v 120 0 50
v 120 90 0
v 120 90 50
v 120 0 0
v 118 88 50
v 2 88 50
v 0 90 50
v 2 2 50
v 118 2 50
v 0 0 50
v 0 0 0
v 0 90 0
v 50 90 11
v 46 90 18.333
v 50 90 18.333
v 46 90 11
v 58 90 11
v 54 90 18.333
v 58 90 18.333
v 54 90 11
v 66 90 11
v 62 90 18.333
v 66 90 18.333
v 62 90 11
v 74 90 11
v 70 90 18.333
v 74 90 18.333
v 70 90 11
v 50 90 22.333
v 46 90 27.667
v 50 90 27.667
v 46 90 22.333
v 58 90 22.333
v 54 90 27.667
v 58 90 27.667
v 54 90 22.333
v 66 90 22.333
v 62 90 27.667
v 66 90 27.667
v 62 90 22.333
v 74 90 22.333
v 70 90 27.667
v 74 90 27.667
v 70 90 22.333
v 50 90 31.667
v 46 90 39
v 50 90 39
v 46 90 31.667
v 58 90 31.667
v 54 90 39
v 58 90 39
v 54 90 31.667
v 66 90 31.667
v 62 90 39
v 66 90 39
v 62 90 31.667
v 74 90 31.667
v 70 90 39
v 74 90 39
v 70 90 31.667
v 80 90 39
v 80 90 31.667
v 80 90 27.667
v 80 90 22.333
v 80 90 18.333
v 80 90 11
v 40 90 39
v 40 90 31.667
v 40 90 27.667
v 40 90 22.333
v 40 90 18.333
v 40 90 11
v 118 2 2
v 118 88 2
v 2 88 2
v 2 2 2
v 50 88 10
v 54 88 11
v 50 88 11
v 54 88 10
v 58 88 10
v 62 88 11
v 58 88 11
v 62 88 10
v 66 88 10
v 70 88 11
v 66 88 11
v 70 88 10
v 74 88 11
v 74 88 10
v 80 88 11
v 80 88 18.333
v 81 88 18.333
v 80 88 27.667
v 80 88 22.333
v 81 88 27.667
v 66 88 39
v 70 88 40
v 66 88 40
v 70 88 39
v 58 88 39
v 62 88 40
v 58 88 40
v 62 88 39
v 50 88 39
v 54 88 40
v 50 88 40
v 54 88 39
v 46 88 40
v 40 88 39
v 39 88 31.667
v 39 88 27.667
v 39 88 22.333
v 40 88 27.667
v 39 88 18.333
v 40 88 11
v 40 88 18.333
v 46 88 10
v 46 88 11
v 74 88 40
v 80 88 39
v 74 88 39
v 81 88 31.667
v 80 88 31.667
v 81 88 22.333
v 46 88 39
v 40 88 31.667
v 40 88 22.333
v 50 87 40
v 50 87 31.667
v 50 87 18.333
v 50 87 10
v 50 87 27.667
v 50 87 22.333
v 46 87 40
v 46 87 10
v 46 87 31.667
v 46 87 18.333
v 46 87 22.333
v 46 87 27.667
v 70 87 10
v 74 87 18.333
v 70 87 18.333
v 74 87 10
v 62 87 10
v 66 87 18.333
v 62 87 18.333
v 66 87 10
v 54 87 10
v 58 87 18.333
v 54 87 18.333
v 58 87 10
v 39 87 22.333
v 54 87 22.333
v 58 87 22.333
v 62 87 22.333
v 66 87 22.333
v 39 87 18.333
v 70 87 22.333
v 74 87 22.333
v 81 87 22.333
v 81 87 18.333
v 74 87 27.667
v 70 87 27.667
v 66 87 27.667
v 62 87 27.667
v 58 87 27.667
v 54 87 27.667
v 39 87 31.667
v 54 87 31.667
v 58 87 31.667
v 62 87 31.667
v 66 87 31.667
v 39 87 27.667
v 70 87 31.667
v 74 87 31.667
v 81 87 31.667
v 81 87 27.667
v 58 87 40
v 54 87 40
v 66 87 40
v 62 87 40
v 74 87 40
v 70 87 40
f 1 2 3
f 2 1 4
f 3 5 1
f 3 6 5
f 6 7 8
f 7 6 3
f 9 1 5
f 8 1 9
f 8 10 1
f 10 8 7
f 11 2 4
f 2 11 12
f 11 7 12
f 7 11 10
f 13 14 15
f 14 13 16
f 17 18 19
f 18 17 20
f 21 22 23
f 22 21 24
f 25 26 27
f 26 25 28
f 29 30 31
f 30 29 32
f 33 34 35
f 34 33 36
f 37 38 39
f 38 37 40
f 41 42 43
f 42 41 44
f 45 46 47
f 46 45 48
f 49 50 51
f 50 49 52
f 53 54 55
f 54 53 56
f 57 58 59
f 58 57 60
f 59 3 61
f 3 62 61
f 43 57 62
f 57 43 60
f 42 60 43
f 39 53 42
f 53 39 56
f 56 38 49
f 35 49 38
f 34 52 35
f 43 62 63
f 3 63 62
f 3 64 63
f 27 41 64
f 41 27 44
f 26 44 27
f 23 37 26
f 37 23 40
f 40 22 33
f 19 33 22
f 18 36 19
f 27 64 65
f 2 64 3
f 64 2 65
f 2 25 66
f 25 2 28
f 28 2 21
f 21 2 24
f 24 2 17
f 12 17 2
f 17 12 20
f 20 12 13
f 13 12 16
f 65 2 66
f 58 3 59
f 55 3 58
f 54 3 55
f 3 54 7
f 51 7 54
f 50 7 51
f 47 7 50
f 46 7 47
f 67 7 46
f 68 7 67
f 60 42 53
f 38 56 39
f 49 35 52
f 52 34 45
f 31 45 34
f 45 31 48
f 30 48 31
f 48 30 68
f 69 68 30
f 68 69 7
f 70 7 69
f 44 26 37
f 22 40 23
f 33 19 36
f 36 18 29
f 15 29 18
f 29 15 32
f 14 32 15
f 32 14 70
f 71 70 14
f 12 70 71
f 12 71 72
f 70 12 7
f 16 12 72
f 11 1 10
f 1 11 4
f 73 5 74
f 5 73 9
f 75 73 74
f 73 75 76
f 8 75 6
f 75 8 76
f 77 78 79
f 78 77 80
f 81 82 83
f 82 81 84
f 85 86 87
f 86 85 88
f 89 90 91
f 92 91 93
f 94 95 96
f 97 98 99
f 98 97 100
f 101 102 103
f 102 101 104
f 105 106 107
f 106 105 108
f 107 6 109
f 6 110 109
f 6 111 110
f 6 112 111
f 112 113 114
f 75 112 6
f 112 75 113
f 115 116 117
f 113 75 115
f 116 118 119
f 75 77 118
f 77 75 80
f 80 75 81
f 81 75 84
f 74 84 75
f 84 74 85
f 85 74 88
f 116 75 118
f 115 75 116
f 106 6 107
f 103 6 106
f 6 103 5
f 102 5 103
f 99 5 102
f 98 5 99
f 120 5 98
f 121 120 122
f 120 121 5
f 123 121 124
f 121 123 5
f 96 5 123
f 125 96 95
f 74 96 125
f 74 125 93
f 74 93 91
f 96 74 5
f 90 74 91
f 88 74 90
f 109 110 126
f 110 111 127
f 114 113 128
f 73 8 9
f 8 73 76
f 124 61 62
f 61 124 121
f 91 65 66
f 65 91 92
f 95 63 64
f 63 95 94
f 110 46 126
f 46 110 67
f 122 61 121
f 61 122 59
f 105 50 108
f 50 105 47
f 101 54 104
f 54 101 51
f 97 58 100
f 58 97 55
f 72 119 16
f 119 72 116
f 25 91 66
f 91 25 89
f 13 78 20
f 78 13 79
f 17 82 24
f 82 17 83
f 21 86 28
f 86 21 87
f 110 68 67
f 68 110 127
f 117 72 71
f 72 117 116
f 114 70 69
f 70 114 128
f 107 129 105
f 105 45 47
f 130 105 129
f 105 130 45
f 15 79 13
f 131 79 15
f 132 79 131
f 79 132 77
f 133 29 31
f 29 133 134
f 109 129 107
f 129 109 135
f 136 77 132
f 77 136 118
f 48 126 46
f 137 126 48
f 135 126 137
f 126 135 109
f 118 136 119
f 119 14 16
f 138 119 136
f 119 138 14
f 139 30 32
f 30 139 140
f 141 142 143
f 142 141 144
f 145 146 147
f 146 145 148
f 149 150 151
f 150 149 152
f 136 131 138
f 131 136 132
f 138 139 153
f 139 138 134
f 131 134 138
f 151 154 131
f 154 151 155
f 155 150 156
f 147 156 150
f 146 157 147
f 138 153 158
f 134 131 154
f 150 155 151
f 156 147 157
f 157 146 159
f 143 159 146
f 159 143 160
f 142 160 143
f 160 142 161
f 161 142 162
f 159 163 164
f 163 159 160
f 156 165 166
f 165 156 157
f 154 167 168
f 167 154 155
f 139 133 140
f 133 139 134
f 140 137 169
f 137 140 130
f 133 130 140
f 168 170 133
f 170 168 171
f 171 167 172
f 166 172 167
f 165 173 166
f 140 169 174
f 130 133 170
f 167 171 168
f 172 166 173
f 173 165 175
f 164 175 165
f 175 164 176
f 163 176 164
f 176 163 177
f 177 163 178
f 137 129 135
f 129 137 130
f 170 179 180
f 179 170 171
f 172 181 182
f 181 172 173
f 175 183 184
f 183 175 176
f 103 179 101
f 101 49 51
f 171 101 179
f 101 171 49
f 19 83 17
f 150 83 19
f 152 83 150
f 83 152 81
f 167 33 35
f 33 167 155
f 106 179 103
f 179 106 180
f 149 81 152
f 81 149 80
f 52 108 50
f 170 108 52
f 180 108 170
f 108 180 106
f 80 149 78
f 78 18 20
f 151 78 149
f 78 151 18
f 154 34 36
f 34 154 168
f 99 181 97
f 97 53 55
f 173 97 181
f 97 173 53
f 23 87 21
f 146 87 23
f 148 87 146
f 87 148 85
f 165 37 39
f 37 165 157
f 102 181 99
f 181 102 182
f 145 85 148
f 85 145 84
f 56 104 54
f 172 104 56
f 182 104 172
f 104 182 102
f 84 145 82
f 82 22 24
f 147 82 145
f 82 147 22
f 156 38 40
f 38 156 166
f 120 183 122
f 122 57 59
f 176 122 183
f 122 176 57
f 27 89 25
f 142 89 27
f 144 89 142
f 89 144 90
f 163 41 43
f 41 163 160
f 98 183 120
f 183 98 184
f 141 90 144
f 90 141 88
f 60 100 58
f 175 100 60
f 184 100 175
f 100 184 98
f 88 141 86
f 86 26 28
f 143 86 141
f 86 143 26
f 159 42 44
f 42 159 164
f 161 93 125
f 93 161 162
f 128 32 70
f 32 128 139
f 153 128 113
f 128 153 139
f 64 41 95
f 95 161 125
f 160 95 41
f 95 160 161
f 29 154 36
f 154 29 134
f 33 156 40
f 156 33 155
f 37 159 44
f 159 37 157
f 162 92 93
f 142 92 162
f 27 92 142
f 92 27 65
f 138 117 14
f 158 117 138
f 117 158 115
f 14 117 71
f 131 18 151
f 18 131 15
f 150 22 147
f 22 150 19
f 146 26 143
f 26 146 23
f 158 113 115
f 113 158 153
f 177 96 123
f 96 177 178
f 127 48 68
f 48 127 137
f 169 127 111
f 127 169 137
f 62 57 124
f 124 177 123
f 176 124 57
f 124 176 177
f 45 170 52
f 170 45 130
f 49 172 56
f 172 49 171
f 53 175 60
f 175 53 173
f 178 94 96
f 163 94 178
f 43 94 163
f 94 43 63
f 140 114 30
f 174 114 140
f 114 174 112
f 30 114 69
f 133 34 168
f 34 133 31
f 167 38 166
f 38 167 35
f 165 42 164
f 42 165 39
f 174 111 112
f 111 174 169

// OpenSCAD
$fn = 32;

// ----------------------------------------------------------------------
// Vent box: crossgrid enclosure
// ----------------------------------------------------------------------

// --- parameters (mm) ---
box_l = 120;              // box length, X
box_w = 90;               // box width, Y
box_h = 50;               // box height, Z
wall_t = 2;               // shell wall thickness
win_l = 40;               // vent window width, X
win_h = 28;               // vent window height, Z
bar_w = 4;                // grid bar width
n_v = 4;                  // vertical bar count
n_h = 2;                  // horizontal bar count

win_z0 = (box_h - win_h) / 2;  // window lower edge Z
v_step = win_l / (n_v + 1);  // vertical bar step
h_step = win_h / (n_h + 1);  // horizontal bar step

difference() {
  union() {
    difference() {
      cube([box_l, box_w, box_h]);
  translate([wall_t, wall_t, wall_t])
    cube([box_l - 2 * wall_t, box_w - 2 * wall_t, box_h]);
  translate([(box_l - win_l) / 2, box_w - wall_t - 1, win_z0])
    cube([win_l, wall_t + 2, win_h]);
    }
    for (i = [1 : n_v])
      translate([(box_l - win_l) / 2 + i * v_step - bar_w / 2,
                 box_w - wall_t - 1, win_z0 - 1])
        cube([bar_w, wall_t + 1, win_h + 2]);
    for (i = [1 : n_h])
      translate([(box_l - win_l) / 2 - 1, box_w - wall_t - 1,
                 win_z0 + i * h_step - bar_w / 2])
        cube([win_l + 2, wall_t + 1, bar_w]);
  }
}
